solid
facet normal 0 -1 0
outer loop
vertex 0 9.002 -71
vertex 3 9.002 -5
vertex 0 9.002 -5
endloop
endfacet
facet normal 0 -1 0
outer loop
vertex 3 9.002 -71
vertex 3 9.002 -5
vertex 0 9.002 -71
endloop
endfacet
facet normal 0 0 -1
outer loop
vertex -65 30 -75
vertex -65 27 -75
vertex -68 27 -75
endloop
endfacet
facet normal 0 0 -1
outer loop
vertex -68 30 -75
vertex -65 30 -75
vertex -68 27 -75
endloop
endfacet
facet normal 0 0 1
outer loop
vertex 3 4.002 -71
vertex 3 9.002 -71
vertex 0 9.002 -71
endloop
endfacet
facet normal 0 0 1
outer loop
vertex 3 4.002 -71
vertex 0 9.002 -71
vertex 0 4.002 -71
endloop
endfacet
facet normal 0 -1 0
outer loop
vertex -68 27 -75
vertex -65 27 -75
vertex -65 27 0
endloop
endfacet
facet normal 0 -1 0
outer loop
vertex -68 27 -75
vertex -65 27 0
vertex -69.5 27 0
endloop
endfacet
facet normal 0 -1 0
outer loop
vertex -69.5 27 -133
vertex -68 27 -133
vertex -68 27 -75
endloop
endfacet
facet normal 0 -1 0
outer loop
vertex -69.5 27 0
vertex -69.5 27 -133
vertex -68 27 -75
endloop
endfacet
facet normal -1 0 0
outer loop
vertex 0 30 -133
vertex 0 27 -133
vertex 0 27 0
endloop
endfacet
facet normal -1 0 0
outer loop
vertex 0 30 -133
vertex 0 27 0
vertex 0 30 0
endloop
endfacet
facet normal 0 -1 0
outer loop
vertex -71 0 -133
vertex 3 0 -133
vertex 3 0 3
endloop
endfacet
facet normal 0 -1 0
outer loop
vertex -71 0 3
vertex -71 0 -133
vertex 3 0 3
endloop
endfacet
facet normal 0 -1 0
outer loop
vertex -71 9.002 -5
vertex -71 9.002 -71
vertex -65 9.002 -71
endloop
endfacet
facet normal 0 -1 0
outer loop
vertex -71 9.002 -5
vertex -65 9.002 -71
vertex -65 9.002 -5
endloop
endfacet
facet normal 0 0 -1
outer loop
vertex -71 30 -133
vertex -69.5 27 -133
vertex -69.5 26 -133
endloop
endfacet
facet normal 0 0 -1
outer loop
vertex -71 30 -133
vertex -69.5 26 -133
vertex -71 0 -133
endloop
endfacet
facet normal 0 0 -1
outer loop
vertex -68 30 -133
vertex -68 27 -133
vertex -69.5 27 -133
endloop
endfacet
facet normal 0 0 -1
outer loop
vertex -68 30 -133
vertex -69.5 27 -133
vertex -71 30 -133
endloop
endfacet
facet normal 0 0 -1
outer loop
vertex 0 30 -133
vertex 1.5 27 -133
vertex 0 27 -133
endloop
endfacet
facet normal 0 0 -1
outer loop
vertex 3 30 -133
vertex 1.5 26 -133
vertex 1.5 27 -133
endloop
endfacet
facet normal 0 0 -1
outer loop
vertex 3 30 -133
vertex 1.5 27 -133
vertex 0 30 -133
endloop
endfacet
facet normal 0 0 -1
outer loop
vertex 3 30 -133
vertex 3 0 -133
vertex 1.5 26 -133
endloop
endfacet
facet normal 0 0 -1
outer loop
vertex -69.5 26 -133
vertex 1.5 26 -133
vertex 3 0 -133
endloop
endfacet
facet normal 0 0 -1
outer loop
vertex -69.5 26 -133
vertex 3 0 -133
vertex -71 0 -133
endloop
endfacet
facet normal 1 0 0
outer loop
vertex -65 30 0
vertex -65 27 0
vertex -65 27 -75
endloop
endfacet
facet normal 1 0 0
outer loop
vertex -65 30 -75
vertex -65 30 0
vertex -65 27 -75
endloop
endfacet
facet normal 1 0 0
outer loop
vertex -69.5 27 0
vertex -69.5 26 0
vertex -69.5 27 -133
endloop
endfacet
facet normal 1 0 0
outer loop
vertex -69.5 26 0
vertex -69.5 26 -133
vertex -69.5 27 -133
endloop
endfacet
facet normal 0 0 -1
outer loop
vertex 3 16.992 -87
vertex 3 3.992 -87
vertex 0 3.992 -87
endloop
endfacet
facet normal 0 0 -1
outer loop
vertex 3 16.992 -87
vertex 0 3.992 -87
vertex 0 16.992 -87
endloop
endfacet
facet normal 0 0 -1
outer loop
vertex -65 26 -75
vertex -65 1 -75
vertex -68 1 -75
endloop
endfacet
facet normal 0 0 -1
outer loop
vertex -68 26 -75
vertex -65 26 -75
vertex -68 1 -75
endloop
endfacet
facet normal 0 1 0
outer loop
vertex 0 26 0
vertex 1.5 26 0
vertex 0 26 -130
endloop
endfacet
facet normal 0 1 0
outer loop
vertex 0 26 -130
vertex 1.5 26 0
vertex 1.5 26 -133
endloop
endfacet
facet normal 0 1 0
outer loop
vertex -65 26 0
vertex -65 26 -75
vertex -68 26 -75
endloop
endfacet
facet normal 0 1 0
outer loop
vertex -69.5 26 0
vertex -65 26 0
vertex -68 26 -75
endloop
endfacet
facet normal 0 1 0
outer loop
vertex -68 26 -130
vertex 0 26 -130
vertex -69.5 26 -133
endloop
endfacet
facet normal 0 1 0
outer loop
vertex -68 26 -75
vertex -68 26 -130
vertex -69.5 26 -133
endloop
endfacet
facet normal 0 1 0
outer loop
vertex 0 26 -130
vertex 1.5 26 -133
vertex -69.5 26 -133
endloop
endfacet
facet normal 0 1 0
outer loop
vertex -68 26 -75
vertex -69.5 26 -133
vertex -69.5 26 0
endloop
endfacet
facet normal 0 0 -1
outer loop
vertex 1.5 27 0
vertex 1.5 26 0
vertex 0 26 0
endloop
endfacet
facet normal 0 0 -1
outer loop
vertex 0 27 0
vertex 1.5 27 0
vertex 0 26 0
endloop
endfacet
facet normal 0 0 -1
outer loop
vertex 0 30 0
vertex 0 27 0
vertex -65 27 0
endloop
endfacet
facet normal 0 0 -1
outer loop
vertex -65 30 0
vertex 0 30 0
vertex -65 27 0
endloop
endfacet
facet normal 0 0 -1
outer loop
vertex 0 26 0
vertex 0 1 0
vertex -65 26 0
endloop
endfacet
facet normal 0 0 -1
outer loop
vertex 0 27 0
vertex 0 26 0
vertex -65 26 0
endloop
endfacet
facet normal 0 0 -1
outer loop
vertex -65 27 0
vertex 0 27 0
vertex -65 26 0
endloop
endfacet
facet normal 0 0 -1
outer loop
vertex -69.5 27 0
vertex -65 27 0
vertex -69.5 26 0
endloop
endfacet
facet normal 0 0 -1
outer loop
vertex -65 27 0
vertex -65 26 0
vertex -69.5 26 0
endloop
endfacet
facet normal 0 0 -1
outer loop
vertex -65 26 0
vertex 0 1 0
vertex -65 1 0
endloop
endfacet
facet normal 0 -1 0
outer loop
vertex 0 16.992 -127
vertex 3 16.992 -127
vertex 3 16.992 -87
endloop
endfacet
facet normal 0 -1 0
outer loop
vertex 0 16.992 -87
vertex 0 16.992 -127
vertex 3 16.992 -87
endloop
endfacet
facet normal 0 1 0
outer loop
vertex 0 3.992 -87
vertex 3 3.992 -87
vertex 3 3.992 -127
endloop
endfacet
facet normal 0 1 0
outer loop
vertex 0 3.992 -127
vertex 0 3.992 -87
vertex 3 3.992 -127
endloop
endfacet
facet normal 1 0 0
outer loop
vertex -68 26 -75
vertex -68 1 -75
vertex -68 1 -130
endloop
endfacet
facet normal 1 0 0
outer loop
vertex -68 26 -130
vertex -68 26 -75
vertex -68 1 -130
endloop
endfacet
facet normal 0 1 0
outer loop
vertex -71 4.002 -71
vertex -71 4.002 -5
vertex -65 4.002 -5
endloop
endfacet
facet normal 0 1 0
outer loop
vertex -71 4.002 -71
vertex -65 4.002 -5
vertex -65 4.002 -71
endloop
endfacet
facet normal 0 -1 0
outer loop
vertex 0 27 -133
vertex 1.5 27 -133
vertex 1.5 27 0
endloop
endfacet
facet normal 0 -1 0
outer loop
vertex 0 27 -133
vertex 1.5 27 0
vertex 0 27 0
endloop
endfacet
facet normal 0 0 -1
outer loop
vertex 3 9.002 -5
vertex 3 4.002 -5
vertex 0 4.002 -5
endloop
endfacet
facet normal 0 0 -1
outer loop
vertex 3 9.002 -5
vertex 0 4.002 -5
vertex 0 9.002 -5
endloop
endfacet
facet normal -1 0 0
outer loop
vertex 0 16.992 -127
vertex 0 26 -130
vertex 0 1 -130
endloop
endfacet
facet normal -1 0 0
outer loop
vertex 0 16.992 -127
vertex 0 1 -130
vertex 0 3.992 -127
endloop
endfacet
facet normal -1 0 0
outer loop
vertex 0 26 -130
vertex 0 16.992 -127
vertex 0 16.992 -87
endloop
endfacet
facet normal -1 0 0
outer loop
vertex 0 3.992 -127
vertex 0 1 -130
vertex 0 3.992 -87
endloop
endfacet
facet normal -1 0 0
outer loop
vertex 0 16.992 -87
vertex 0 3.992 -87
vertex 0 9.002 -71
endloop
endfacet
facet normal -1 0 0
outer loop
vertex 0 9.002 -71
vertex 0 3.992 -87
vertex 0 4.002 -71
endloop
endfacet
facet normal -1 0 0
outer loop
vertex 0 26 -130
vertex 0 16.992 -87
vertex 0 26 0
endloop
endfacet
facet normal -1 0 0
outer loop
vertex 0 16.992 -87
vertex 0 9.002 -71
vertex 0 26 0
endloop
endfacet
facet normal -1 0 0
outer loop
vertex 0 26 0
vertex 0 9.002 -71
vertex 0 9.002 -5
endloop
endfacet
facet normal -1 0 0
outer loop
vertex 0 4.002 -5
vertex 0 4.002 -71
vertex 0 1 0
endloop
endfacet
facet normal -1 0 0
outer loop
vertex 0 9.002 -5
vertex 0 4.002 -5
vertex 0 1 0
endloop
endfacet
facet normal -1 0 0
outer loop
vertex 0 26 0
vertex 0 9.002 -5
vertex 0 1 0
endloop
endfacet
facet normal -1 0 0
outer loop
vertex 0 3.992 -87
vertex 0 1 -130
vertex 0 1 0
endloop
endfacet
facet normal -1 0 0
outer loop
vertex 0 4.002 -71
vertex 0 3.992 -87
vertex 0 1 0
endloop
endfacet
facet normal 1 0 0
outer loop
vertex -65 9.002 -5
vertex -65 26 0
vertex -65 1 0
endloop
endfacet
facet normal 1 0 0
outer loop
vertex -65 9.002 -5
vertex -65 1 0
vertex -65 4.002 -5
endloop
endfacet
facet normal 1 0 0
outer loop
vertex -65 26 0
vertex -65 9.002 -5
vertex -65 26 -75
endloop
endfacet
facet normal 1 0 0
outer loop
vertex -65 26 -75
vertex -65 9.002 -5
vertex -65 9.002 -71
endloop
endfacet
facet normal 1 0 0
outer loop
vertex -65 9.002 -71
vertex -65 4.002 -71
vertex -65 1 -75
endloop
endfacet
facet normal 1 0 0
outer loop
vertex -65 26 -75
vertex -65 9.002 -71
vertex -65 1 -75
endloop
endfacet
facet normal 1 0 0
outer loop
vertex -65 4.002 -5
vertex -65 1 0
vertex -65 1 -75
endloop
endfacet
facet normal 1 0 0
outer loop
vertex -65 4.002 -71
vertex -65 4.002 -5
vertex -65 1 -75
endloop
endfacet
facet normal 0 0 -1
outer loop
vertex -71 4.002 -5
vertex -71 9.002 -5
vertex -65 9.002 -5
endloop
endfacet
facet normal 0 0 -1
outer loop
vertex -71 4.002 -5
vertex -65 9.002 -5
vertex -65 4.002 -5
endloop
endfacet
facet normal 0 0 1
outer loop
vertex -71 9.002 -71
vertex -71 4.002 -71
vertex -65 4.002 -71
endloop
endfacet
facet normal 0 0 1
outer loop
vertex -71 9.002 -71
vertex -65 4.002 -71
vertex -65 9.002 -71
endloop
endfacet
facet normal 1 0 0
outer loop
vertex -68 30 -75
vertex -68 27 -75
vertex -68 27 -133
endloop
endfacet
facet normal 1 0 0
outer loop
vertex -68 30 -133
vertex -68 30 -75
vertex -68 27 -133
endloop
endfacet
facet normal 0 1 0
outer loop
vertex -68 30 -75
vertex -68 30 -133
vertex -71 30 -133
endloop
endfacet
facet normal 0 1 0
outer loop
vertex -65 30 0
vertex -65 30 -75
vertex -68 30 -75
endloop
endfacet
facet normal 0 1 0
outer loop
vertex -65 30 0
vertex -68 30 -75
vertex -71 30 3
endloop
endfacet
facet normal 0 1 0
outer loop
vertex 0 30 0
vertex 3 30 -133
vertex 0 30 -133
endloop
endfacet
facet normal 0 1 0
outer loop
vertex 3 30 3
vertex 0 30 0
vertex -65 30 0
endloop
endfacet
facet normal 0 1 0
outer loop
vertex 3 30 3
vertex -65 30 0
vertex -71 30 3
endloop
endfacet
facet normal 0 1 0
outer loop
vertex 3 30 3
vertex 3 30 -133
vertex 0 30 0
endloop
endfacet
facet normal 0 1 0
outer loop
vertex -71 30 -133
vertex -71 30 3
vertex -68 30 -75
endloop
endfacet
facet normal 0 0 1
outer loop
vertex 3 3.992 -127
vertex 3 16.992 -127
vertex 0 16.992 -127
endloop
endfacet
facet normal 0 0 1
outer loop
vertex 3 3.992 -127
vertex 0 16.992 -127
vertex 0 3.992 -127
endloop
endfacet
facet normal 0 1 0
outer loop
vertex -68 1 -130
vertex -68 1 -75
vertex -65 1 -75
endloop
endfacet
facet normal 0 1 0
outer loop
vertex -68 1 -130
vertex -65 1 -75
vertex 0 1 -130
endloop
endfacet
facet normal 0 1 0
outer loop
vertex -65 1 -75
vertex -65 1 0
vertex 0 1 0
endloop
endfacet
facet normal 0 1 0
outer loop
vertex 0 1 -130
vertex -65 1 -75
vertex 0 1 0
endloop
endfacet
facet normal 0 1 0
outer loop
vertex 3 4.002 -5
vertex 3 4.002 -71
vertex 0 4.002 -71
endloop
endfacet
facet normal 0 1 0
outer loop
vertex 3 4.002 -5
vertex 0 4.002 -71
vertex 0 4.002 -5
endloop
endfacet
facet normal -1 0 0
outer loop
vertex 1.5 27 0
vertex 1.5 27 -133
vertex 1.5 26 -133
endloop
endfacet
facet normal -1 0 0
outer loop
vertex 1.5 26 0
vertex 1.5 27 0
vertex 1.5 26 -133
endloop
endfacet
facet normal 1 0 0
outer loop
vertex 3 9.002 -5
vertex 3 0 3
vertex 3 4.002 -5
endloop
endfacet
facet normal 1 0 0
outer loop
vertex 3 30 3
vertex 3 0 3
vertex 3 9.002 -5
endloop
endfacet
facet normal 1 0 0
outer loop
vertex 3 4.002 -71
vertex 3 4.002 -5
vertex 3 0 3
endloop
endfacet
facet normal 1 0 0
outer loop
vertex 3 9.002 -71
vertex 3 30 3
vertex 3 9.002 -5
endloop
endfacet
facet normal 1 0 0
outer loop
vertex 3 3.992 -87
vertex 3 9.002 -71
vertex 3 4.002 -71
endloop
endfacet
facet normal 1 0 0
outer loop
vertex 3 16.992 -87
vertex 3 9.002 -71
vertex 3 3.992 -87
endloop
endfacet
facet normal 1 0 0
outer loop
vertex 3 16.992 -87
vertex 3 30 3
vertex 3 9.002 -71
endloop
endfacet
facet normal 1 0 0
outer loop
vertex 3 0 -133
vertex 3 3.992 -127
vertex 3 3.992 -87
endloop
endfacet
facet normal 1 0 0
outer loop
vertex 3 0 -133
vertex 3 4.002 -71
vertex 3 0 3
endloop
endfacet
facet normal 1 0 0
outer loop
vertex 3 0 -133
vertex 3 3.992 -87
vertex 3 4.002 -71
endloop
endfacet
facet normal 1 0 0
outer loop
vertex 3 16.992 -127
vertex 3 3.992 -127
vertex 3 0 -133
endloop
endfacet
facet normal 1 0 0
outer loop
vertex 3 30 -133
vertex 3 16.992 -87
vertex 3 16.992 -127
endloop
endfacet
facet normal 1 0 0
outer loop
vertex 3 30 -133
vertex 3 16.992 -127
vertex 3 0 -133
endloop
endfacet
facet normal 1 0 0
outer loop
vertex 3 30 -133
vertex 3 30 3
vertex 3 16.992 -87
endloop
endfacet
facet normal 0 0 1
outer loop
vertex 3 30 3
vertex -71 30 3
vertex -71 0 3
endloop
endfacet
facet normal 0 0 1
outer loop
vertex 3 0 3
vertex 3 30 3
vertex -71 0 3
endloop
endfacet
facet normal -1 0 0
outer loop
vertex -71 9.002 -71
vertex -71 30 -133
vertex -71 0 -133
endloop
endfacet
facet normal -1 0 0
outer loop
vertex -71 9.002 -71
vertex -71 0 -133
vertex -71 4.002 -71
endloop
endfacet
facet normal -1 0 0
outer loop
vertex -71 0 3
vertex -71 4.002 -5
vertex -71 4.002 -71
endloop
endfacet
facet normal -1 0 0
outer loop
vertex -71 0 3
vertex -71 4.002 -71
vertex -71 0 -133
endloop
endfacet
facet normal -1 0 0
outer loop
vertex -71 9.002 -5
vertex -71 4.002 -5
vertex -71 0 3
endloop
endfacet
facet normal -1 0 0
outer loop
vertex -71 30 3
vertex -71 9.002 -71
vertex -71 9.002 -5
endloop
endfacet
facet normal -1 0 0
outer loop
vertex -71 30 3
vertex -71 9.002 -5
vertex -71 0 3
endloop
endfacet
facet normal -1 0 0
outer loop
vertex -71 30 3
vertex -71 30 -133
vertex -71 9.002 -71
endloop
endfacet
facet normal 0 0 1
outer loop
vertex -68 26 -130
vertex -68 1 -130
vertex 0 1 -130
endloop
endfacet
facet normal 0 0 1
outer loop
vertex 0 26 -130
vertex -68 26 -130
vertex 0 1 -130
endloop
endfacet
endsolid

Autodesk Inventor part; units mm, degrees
sketch "Sketch1" plane through (0, 0, 0) normal (0, 1, 0) x (-1, 0, 0)
  line L0 (0, 0) -> (68, 0)
  line L1 (68, -75) -> (68, -130)
  line L2 (68, -130) -> (0, -130)
  line L3 (0, -130) -> (0, 0)
  line L4 (68, 0) -> (65, 0)
  line L5 (65, 0) -> (65, -75)
  line L6 (65, -75) -> (68, -75)
  line L7 (0, 0) -> (0, 1)
  line L8 (0, 1) -> (69, 1)
  line L9 (69, 1) -> (69, -131)
  line L10 (69, -131) -> (-1, -131)
  line L11 (-1, -131) -> (-1, 1)
  line L12 (-1, 1) -> (0, 1)
  dimension "d0" = 68
  dimension "d1" = 130
  dimension "d2" = 3
  dimension "d3" = 75
  dimension "d4" = 1
  dimension "d5" = 69
  dimension "d6" = 132
  dimension "d7" = 70
extrude "Extrusion1" add sketch "Sketch1" along normal blind 30
sketch "Sketch2" plane through (0, 0, 0) normal (0, -1, 0) x (1, 0, 0)
  line L0 (0, 0) -> (-65, 0) projected
  line L1 (-68, -75) -> (-68, -130) projected
  line L2 (0, 0) -> (-68, 0)
  line L3 (-68, 0) -> (-68, -130)
  line L4 (-68, -130) -> (0, -130)
  line L5 (0, -130) -> (0, 0)
extrude "Extrusion2" add sketch "Sketch2" against normal blind 1
sketch "Sketch3" plane through (1, 0, 1) normal (1, 0, 0) x (0, 0, -1)
  line L0 (131, 1) -> (1, 1) projected
  line L1 (1, 1) -> (1, 6)
  line L2 (1, 1) -> (1, 30) projected
  line L3 (1, 6) -> (1, 1)
  line L4 (1, 6) -> (6, 6)
  line L5 (6, 9.0023) -> (72, 9.0023)
  line L6 (72, 9.0023) -> (72, 4.0023)
  line L7 (72, 4.0023) -> (6, 4.0023)
  line L8 (6, 4.0023) -> (6, 9.0023)
  line L9 (6, 1) -> (6, 4)
  point P0 (1, 0)
  dimension "d12" = 5
  dimension "d13" = 5
  dimension "d14" = 5
  dimension "d15" = 66
  dimension "d23" = 3
extrude "Extrusion3" cut sketch "Sketch3" along normal blind 34.75 and the other way blind 4
ref_plane "Work Plane1" through (-34, 30, -130) normal (-1, 0, 0) x (0, 0, 1)
mirror "Mirror1" about plane through (-34, 30, -130) normal (-1, 0, 0) of "Extrusion3"
sketch "Sketch4" plane through (1, 0, 1) normal (1, 0, 0) x (0, 0, -1)
  line L0 (131, 1) -> (131, 30) projected
  line L1 (131, 1) -> (128, 1)
  line L2 (76, 1) -> (131, 1) projected
  line L3 (128, 3.992) -> (128, 16.992)
  line L4 (128, 16.992) -> (88, 16.992)
  line L5 (88, 16.992) -> (88, 3.992)
  line L6 (88, 3.992) -> (128, 3.992)
  line L7 (132, 0) -> (0, 0) projected
  line L8 (88, 1) -> (88, 4)
  point P0 (1, 0)
  dimension "d18" = 3
  dimension "d19" = 13
  dimension "d20" = 40
  dimension "d24" = 3
extrude "Extrusion4" cut sketch "Sketch4" against normal blind 5
sketch "Sketch5" plane through (-69, 0, 1) normal (0, 0, 1) x (1, 0, 0)
  line L0 (70, 0) -> (70, 30) projected
  line L1 (0, 0) -> (70, 0)
  line L2 (70, 0) -> (70, 30)
  line L3 (70, 30) -> (0, 30)
  line L4 (0, 30) -> (0, 0)
  point P0 (69, 0)
extrude "Extrusion5" add sketch "Sketch5" along normal blind 2
ref_plane "Work Plane2" through (0, 30, -65) normal (0, 0, -1) x (-1, 0, 0)
mirror "Mirror2" about plane through (0, 30, -65) normal (0, 0, -1) of "Extrusion5"
sketch "Sketch6" plane through (1, 0, 3) normal (1, 0, 0) x (0, 0, -1)
  line L0 (0, 0) -> (0, 30) projected
  line L1 (0, 0) -> (136, 0) projected
  line L2 (0, 30) -> (136, 30)
  line L3 (136, 30) -> (136, 0)
  line L4 (136, 0) -> (0, 0)
  line L5 (0, 0) -> (0, 30)
  point P0 (3, 0)
extrude "Extrusion6" add sketch "Sketch6" along normal blind 2
ref_plane "Work Plane3" through (-34, 30, -75) normal (1, 0, 0) x (0, 0, -1)
mirror "Mirror3" about plane through (-34, 30, -75) normal (1, 0, 0) of "Extrusion6"
sketch "Sketch7" plane through (-71, 0, -133) normal (-1, 0, 0) x (0, 0, 1)
  line L0 (62, 9.0023) -> (128, 9.0023) projected
  line L1 (128, 4.0023) -> (62, 4.0023) projected
  line L2 (62, 9.0023) -> (128, 9.0023)
  line L3 (128, 9.0023) -> (128, 4.0023)
  line L4 (128, 4.0023) -> (62, 4.0023)
  line L5 (62, 4.0023) -> (62, 9.0023)
  point P0 (133, 0)
  point P1 (62, 4.0023)
extrude "Extrusion7" cut sketch "Sketch7" against normal blind 34.75
mirror "Mirror4" about plane through (-34, 30, -130) normal (-1, 0, 0) of "Extrusion7"
sketch "Sketch8" plane through (3, 0, 3) normal (1, 0, 0) x (0, 0, -1)
  line L0 (130, 16.992) -> (90, 16.992) projected
  line L1 (90, 3.992) -> (130, 3.992) projected
  line L2 (90, 16.992) -> (130, 16.992)
  line L3 (130, 16.992) -> (130, 3.992)
  line L4 (130, 3.992) -> (90, 3.992)
  line L5 (90, 3.992) -> (90, 16.992)
  point P0 (3, 0)
extrude "Extrusion8" cut sketch "Sketch8" against normal blind 34.75
sketch "Sketch9" plane through (3, 0, -133) normal (0, 0, -1) x (-1, 0, 0)
  line L0 (71, 1) -> (71, 30) projected
  line L1 (71, 30) -> (71, 27)
  line L2 (71, 1) -> (71, 30) projected
  line L3 (71, 27) -> (72.5, 27)
  line L4 (74, 0) -> (74, 30) projected
  line L5 (74, 30) -> (0, 30) projected
  line L6 (3, 30) -> (3, 27)
  line L7 (3, 27) -> (1.5, 27)
  line L8 (72.5, 27) -> (1.5, 27)
  line L9 (1.5, 27) -> (1.5, 26)
  line L10 (1.5, 26) -> (72.5, 26)
  line L11 (72.5, 26) -> (72.5, 27)
  point P0 (3, 0)
  dimension "d35" = 3
  dimension "d36" = 1.5
  dimension "d37" = 1.5
  dimension "d38" = 1
extrude "Extrusion9" cut sketch "Sketch9" against normal blind 133 contours L3 L11 L10 L0 | L0 L10 L9 L7 L8
sketch "Sketch10" plane through (3, 0, -133) normal (0, 0, -1) x (-1, 0, 0)
  line L0 (0, 30) -> (74, 30) projected
  line L1 (71, 27) -> (3, 27) projected
  line L2 (3, 30) -> (71, 30)
  line L3 (71, 30) -> (71, 27)
  line L4 (71, 27) -> (3, 27)
  line L5 (3, 27) -> (3, 30)
  point P0 (3, 0)
extrude "Extrusion10" cut sketch "Sketch10" against normal blind 3
properties part number "ESP 32 a&b gabung test 4"
